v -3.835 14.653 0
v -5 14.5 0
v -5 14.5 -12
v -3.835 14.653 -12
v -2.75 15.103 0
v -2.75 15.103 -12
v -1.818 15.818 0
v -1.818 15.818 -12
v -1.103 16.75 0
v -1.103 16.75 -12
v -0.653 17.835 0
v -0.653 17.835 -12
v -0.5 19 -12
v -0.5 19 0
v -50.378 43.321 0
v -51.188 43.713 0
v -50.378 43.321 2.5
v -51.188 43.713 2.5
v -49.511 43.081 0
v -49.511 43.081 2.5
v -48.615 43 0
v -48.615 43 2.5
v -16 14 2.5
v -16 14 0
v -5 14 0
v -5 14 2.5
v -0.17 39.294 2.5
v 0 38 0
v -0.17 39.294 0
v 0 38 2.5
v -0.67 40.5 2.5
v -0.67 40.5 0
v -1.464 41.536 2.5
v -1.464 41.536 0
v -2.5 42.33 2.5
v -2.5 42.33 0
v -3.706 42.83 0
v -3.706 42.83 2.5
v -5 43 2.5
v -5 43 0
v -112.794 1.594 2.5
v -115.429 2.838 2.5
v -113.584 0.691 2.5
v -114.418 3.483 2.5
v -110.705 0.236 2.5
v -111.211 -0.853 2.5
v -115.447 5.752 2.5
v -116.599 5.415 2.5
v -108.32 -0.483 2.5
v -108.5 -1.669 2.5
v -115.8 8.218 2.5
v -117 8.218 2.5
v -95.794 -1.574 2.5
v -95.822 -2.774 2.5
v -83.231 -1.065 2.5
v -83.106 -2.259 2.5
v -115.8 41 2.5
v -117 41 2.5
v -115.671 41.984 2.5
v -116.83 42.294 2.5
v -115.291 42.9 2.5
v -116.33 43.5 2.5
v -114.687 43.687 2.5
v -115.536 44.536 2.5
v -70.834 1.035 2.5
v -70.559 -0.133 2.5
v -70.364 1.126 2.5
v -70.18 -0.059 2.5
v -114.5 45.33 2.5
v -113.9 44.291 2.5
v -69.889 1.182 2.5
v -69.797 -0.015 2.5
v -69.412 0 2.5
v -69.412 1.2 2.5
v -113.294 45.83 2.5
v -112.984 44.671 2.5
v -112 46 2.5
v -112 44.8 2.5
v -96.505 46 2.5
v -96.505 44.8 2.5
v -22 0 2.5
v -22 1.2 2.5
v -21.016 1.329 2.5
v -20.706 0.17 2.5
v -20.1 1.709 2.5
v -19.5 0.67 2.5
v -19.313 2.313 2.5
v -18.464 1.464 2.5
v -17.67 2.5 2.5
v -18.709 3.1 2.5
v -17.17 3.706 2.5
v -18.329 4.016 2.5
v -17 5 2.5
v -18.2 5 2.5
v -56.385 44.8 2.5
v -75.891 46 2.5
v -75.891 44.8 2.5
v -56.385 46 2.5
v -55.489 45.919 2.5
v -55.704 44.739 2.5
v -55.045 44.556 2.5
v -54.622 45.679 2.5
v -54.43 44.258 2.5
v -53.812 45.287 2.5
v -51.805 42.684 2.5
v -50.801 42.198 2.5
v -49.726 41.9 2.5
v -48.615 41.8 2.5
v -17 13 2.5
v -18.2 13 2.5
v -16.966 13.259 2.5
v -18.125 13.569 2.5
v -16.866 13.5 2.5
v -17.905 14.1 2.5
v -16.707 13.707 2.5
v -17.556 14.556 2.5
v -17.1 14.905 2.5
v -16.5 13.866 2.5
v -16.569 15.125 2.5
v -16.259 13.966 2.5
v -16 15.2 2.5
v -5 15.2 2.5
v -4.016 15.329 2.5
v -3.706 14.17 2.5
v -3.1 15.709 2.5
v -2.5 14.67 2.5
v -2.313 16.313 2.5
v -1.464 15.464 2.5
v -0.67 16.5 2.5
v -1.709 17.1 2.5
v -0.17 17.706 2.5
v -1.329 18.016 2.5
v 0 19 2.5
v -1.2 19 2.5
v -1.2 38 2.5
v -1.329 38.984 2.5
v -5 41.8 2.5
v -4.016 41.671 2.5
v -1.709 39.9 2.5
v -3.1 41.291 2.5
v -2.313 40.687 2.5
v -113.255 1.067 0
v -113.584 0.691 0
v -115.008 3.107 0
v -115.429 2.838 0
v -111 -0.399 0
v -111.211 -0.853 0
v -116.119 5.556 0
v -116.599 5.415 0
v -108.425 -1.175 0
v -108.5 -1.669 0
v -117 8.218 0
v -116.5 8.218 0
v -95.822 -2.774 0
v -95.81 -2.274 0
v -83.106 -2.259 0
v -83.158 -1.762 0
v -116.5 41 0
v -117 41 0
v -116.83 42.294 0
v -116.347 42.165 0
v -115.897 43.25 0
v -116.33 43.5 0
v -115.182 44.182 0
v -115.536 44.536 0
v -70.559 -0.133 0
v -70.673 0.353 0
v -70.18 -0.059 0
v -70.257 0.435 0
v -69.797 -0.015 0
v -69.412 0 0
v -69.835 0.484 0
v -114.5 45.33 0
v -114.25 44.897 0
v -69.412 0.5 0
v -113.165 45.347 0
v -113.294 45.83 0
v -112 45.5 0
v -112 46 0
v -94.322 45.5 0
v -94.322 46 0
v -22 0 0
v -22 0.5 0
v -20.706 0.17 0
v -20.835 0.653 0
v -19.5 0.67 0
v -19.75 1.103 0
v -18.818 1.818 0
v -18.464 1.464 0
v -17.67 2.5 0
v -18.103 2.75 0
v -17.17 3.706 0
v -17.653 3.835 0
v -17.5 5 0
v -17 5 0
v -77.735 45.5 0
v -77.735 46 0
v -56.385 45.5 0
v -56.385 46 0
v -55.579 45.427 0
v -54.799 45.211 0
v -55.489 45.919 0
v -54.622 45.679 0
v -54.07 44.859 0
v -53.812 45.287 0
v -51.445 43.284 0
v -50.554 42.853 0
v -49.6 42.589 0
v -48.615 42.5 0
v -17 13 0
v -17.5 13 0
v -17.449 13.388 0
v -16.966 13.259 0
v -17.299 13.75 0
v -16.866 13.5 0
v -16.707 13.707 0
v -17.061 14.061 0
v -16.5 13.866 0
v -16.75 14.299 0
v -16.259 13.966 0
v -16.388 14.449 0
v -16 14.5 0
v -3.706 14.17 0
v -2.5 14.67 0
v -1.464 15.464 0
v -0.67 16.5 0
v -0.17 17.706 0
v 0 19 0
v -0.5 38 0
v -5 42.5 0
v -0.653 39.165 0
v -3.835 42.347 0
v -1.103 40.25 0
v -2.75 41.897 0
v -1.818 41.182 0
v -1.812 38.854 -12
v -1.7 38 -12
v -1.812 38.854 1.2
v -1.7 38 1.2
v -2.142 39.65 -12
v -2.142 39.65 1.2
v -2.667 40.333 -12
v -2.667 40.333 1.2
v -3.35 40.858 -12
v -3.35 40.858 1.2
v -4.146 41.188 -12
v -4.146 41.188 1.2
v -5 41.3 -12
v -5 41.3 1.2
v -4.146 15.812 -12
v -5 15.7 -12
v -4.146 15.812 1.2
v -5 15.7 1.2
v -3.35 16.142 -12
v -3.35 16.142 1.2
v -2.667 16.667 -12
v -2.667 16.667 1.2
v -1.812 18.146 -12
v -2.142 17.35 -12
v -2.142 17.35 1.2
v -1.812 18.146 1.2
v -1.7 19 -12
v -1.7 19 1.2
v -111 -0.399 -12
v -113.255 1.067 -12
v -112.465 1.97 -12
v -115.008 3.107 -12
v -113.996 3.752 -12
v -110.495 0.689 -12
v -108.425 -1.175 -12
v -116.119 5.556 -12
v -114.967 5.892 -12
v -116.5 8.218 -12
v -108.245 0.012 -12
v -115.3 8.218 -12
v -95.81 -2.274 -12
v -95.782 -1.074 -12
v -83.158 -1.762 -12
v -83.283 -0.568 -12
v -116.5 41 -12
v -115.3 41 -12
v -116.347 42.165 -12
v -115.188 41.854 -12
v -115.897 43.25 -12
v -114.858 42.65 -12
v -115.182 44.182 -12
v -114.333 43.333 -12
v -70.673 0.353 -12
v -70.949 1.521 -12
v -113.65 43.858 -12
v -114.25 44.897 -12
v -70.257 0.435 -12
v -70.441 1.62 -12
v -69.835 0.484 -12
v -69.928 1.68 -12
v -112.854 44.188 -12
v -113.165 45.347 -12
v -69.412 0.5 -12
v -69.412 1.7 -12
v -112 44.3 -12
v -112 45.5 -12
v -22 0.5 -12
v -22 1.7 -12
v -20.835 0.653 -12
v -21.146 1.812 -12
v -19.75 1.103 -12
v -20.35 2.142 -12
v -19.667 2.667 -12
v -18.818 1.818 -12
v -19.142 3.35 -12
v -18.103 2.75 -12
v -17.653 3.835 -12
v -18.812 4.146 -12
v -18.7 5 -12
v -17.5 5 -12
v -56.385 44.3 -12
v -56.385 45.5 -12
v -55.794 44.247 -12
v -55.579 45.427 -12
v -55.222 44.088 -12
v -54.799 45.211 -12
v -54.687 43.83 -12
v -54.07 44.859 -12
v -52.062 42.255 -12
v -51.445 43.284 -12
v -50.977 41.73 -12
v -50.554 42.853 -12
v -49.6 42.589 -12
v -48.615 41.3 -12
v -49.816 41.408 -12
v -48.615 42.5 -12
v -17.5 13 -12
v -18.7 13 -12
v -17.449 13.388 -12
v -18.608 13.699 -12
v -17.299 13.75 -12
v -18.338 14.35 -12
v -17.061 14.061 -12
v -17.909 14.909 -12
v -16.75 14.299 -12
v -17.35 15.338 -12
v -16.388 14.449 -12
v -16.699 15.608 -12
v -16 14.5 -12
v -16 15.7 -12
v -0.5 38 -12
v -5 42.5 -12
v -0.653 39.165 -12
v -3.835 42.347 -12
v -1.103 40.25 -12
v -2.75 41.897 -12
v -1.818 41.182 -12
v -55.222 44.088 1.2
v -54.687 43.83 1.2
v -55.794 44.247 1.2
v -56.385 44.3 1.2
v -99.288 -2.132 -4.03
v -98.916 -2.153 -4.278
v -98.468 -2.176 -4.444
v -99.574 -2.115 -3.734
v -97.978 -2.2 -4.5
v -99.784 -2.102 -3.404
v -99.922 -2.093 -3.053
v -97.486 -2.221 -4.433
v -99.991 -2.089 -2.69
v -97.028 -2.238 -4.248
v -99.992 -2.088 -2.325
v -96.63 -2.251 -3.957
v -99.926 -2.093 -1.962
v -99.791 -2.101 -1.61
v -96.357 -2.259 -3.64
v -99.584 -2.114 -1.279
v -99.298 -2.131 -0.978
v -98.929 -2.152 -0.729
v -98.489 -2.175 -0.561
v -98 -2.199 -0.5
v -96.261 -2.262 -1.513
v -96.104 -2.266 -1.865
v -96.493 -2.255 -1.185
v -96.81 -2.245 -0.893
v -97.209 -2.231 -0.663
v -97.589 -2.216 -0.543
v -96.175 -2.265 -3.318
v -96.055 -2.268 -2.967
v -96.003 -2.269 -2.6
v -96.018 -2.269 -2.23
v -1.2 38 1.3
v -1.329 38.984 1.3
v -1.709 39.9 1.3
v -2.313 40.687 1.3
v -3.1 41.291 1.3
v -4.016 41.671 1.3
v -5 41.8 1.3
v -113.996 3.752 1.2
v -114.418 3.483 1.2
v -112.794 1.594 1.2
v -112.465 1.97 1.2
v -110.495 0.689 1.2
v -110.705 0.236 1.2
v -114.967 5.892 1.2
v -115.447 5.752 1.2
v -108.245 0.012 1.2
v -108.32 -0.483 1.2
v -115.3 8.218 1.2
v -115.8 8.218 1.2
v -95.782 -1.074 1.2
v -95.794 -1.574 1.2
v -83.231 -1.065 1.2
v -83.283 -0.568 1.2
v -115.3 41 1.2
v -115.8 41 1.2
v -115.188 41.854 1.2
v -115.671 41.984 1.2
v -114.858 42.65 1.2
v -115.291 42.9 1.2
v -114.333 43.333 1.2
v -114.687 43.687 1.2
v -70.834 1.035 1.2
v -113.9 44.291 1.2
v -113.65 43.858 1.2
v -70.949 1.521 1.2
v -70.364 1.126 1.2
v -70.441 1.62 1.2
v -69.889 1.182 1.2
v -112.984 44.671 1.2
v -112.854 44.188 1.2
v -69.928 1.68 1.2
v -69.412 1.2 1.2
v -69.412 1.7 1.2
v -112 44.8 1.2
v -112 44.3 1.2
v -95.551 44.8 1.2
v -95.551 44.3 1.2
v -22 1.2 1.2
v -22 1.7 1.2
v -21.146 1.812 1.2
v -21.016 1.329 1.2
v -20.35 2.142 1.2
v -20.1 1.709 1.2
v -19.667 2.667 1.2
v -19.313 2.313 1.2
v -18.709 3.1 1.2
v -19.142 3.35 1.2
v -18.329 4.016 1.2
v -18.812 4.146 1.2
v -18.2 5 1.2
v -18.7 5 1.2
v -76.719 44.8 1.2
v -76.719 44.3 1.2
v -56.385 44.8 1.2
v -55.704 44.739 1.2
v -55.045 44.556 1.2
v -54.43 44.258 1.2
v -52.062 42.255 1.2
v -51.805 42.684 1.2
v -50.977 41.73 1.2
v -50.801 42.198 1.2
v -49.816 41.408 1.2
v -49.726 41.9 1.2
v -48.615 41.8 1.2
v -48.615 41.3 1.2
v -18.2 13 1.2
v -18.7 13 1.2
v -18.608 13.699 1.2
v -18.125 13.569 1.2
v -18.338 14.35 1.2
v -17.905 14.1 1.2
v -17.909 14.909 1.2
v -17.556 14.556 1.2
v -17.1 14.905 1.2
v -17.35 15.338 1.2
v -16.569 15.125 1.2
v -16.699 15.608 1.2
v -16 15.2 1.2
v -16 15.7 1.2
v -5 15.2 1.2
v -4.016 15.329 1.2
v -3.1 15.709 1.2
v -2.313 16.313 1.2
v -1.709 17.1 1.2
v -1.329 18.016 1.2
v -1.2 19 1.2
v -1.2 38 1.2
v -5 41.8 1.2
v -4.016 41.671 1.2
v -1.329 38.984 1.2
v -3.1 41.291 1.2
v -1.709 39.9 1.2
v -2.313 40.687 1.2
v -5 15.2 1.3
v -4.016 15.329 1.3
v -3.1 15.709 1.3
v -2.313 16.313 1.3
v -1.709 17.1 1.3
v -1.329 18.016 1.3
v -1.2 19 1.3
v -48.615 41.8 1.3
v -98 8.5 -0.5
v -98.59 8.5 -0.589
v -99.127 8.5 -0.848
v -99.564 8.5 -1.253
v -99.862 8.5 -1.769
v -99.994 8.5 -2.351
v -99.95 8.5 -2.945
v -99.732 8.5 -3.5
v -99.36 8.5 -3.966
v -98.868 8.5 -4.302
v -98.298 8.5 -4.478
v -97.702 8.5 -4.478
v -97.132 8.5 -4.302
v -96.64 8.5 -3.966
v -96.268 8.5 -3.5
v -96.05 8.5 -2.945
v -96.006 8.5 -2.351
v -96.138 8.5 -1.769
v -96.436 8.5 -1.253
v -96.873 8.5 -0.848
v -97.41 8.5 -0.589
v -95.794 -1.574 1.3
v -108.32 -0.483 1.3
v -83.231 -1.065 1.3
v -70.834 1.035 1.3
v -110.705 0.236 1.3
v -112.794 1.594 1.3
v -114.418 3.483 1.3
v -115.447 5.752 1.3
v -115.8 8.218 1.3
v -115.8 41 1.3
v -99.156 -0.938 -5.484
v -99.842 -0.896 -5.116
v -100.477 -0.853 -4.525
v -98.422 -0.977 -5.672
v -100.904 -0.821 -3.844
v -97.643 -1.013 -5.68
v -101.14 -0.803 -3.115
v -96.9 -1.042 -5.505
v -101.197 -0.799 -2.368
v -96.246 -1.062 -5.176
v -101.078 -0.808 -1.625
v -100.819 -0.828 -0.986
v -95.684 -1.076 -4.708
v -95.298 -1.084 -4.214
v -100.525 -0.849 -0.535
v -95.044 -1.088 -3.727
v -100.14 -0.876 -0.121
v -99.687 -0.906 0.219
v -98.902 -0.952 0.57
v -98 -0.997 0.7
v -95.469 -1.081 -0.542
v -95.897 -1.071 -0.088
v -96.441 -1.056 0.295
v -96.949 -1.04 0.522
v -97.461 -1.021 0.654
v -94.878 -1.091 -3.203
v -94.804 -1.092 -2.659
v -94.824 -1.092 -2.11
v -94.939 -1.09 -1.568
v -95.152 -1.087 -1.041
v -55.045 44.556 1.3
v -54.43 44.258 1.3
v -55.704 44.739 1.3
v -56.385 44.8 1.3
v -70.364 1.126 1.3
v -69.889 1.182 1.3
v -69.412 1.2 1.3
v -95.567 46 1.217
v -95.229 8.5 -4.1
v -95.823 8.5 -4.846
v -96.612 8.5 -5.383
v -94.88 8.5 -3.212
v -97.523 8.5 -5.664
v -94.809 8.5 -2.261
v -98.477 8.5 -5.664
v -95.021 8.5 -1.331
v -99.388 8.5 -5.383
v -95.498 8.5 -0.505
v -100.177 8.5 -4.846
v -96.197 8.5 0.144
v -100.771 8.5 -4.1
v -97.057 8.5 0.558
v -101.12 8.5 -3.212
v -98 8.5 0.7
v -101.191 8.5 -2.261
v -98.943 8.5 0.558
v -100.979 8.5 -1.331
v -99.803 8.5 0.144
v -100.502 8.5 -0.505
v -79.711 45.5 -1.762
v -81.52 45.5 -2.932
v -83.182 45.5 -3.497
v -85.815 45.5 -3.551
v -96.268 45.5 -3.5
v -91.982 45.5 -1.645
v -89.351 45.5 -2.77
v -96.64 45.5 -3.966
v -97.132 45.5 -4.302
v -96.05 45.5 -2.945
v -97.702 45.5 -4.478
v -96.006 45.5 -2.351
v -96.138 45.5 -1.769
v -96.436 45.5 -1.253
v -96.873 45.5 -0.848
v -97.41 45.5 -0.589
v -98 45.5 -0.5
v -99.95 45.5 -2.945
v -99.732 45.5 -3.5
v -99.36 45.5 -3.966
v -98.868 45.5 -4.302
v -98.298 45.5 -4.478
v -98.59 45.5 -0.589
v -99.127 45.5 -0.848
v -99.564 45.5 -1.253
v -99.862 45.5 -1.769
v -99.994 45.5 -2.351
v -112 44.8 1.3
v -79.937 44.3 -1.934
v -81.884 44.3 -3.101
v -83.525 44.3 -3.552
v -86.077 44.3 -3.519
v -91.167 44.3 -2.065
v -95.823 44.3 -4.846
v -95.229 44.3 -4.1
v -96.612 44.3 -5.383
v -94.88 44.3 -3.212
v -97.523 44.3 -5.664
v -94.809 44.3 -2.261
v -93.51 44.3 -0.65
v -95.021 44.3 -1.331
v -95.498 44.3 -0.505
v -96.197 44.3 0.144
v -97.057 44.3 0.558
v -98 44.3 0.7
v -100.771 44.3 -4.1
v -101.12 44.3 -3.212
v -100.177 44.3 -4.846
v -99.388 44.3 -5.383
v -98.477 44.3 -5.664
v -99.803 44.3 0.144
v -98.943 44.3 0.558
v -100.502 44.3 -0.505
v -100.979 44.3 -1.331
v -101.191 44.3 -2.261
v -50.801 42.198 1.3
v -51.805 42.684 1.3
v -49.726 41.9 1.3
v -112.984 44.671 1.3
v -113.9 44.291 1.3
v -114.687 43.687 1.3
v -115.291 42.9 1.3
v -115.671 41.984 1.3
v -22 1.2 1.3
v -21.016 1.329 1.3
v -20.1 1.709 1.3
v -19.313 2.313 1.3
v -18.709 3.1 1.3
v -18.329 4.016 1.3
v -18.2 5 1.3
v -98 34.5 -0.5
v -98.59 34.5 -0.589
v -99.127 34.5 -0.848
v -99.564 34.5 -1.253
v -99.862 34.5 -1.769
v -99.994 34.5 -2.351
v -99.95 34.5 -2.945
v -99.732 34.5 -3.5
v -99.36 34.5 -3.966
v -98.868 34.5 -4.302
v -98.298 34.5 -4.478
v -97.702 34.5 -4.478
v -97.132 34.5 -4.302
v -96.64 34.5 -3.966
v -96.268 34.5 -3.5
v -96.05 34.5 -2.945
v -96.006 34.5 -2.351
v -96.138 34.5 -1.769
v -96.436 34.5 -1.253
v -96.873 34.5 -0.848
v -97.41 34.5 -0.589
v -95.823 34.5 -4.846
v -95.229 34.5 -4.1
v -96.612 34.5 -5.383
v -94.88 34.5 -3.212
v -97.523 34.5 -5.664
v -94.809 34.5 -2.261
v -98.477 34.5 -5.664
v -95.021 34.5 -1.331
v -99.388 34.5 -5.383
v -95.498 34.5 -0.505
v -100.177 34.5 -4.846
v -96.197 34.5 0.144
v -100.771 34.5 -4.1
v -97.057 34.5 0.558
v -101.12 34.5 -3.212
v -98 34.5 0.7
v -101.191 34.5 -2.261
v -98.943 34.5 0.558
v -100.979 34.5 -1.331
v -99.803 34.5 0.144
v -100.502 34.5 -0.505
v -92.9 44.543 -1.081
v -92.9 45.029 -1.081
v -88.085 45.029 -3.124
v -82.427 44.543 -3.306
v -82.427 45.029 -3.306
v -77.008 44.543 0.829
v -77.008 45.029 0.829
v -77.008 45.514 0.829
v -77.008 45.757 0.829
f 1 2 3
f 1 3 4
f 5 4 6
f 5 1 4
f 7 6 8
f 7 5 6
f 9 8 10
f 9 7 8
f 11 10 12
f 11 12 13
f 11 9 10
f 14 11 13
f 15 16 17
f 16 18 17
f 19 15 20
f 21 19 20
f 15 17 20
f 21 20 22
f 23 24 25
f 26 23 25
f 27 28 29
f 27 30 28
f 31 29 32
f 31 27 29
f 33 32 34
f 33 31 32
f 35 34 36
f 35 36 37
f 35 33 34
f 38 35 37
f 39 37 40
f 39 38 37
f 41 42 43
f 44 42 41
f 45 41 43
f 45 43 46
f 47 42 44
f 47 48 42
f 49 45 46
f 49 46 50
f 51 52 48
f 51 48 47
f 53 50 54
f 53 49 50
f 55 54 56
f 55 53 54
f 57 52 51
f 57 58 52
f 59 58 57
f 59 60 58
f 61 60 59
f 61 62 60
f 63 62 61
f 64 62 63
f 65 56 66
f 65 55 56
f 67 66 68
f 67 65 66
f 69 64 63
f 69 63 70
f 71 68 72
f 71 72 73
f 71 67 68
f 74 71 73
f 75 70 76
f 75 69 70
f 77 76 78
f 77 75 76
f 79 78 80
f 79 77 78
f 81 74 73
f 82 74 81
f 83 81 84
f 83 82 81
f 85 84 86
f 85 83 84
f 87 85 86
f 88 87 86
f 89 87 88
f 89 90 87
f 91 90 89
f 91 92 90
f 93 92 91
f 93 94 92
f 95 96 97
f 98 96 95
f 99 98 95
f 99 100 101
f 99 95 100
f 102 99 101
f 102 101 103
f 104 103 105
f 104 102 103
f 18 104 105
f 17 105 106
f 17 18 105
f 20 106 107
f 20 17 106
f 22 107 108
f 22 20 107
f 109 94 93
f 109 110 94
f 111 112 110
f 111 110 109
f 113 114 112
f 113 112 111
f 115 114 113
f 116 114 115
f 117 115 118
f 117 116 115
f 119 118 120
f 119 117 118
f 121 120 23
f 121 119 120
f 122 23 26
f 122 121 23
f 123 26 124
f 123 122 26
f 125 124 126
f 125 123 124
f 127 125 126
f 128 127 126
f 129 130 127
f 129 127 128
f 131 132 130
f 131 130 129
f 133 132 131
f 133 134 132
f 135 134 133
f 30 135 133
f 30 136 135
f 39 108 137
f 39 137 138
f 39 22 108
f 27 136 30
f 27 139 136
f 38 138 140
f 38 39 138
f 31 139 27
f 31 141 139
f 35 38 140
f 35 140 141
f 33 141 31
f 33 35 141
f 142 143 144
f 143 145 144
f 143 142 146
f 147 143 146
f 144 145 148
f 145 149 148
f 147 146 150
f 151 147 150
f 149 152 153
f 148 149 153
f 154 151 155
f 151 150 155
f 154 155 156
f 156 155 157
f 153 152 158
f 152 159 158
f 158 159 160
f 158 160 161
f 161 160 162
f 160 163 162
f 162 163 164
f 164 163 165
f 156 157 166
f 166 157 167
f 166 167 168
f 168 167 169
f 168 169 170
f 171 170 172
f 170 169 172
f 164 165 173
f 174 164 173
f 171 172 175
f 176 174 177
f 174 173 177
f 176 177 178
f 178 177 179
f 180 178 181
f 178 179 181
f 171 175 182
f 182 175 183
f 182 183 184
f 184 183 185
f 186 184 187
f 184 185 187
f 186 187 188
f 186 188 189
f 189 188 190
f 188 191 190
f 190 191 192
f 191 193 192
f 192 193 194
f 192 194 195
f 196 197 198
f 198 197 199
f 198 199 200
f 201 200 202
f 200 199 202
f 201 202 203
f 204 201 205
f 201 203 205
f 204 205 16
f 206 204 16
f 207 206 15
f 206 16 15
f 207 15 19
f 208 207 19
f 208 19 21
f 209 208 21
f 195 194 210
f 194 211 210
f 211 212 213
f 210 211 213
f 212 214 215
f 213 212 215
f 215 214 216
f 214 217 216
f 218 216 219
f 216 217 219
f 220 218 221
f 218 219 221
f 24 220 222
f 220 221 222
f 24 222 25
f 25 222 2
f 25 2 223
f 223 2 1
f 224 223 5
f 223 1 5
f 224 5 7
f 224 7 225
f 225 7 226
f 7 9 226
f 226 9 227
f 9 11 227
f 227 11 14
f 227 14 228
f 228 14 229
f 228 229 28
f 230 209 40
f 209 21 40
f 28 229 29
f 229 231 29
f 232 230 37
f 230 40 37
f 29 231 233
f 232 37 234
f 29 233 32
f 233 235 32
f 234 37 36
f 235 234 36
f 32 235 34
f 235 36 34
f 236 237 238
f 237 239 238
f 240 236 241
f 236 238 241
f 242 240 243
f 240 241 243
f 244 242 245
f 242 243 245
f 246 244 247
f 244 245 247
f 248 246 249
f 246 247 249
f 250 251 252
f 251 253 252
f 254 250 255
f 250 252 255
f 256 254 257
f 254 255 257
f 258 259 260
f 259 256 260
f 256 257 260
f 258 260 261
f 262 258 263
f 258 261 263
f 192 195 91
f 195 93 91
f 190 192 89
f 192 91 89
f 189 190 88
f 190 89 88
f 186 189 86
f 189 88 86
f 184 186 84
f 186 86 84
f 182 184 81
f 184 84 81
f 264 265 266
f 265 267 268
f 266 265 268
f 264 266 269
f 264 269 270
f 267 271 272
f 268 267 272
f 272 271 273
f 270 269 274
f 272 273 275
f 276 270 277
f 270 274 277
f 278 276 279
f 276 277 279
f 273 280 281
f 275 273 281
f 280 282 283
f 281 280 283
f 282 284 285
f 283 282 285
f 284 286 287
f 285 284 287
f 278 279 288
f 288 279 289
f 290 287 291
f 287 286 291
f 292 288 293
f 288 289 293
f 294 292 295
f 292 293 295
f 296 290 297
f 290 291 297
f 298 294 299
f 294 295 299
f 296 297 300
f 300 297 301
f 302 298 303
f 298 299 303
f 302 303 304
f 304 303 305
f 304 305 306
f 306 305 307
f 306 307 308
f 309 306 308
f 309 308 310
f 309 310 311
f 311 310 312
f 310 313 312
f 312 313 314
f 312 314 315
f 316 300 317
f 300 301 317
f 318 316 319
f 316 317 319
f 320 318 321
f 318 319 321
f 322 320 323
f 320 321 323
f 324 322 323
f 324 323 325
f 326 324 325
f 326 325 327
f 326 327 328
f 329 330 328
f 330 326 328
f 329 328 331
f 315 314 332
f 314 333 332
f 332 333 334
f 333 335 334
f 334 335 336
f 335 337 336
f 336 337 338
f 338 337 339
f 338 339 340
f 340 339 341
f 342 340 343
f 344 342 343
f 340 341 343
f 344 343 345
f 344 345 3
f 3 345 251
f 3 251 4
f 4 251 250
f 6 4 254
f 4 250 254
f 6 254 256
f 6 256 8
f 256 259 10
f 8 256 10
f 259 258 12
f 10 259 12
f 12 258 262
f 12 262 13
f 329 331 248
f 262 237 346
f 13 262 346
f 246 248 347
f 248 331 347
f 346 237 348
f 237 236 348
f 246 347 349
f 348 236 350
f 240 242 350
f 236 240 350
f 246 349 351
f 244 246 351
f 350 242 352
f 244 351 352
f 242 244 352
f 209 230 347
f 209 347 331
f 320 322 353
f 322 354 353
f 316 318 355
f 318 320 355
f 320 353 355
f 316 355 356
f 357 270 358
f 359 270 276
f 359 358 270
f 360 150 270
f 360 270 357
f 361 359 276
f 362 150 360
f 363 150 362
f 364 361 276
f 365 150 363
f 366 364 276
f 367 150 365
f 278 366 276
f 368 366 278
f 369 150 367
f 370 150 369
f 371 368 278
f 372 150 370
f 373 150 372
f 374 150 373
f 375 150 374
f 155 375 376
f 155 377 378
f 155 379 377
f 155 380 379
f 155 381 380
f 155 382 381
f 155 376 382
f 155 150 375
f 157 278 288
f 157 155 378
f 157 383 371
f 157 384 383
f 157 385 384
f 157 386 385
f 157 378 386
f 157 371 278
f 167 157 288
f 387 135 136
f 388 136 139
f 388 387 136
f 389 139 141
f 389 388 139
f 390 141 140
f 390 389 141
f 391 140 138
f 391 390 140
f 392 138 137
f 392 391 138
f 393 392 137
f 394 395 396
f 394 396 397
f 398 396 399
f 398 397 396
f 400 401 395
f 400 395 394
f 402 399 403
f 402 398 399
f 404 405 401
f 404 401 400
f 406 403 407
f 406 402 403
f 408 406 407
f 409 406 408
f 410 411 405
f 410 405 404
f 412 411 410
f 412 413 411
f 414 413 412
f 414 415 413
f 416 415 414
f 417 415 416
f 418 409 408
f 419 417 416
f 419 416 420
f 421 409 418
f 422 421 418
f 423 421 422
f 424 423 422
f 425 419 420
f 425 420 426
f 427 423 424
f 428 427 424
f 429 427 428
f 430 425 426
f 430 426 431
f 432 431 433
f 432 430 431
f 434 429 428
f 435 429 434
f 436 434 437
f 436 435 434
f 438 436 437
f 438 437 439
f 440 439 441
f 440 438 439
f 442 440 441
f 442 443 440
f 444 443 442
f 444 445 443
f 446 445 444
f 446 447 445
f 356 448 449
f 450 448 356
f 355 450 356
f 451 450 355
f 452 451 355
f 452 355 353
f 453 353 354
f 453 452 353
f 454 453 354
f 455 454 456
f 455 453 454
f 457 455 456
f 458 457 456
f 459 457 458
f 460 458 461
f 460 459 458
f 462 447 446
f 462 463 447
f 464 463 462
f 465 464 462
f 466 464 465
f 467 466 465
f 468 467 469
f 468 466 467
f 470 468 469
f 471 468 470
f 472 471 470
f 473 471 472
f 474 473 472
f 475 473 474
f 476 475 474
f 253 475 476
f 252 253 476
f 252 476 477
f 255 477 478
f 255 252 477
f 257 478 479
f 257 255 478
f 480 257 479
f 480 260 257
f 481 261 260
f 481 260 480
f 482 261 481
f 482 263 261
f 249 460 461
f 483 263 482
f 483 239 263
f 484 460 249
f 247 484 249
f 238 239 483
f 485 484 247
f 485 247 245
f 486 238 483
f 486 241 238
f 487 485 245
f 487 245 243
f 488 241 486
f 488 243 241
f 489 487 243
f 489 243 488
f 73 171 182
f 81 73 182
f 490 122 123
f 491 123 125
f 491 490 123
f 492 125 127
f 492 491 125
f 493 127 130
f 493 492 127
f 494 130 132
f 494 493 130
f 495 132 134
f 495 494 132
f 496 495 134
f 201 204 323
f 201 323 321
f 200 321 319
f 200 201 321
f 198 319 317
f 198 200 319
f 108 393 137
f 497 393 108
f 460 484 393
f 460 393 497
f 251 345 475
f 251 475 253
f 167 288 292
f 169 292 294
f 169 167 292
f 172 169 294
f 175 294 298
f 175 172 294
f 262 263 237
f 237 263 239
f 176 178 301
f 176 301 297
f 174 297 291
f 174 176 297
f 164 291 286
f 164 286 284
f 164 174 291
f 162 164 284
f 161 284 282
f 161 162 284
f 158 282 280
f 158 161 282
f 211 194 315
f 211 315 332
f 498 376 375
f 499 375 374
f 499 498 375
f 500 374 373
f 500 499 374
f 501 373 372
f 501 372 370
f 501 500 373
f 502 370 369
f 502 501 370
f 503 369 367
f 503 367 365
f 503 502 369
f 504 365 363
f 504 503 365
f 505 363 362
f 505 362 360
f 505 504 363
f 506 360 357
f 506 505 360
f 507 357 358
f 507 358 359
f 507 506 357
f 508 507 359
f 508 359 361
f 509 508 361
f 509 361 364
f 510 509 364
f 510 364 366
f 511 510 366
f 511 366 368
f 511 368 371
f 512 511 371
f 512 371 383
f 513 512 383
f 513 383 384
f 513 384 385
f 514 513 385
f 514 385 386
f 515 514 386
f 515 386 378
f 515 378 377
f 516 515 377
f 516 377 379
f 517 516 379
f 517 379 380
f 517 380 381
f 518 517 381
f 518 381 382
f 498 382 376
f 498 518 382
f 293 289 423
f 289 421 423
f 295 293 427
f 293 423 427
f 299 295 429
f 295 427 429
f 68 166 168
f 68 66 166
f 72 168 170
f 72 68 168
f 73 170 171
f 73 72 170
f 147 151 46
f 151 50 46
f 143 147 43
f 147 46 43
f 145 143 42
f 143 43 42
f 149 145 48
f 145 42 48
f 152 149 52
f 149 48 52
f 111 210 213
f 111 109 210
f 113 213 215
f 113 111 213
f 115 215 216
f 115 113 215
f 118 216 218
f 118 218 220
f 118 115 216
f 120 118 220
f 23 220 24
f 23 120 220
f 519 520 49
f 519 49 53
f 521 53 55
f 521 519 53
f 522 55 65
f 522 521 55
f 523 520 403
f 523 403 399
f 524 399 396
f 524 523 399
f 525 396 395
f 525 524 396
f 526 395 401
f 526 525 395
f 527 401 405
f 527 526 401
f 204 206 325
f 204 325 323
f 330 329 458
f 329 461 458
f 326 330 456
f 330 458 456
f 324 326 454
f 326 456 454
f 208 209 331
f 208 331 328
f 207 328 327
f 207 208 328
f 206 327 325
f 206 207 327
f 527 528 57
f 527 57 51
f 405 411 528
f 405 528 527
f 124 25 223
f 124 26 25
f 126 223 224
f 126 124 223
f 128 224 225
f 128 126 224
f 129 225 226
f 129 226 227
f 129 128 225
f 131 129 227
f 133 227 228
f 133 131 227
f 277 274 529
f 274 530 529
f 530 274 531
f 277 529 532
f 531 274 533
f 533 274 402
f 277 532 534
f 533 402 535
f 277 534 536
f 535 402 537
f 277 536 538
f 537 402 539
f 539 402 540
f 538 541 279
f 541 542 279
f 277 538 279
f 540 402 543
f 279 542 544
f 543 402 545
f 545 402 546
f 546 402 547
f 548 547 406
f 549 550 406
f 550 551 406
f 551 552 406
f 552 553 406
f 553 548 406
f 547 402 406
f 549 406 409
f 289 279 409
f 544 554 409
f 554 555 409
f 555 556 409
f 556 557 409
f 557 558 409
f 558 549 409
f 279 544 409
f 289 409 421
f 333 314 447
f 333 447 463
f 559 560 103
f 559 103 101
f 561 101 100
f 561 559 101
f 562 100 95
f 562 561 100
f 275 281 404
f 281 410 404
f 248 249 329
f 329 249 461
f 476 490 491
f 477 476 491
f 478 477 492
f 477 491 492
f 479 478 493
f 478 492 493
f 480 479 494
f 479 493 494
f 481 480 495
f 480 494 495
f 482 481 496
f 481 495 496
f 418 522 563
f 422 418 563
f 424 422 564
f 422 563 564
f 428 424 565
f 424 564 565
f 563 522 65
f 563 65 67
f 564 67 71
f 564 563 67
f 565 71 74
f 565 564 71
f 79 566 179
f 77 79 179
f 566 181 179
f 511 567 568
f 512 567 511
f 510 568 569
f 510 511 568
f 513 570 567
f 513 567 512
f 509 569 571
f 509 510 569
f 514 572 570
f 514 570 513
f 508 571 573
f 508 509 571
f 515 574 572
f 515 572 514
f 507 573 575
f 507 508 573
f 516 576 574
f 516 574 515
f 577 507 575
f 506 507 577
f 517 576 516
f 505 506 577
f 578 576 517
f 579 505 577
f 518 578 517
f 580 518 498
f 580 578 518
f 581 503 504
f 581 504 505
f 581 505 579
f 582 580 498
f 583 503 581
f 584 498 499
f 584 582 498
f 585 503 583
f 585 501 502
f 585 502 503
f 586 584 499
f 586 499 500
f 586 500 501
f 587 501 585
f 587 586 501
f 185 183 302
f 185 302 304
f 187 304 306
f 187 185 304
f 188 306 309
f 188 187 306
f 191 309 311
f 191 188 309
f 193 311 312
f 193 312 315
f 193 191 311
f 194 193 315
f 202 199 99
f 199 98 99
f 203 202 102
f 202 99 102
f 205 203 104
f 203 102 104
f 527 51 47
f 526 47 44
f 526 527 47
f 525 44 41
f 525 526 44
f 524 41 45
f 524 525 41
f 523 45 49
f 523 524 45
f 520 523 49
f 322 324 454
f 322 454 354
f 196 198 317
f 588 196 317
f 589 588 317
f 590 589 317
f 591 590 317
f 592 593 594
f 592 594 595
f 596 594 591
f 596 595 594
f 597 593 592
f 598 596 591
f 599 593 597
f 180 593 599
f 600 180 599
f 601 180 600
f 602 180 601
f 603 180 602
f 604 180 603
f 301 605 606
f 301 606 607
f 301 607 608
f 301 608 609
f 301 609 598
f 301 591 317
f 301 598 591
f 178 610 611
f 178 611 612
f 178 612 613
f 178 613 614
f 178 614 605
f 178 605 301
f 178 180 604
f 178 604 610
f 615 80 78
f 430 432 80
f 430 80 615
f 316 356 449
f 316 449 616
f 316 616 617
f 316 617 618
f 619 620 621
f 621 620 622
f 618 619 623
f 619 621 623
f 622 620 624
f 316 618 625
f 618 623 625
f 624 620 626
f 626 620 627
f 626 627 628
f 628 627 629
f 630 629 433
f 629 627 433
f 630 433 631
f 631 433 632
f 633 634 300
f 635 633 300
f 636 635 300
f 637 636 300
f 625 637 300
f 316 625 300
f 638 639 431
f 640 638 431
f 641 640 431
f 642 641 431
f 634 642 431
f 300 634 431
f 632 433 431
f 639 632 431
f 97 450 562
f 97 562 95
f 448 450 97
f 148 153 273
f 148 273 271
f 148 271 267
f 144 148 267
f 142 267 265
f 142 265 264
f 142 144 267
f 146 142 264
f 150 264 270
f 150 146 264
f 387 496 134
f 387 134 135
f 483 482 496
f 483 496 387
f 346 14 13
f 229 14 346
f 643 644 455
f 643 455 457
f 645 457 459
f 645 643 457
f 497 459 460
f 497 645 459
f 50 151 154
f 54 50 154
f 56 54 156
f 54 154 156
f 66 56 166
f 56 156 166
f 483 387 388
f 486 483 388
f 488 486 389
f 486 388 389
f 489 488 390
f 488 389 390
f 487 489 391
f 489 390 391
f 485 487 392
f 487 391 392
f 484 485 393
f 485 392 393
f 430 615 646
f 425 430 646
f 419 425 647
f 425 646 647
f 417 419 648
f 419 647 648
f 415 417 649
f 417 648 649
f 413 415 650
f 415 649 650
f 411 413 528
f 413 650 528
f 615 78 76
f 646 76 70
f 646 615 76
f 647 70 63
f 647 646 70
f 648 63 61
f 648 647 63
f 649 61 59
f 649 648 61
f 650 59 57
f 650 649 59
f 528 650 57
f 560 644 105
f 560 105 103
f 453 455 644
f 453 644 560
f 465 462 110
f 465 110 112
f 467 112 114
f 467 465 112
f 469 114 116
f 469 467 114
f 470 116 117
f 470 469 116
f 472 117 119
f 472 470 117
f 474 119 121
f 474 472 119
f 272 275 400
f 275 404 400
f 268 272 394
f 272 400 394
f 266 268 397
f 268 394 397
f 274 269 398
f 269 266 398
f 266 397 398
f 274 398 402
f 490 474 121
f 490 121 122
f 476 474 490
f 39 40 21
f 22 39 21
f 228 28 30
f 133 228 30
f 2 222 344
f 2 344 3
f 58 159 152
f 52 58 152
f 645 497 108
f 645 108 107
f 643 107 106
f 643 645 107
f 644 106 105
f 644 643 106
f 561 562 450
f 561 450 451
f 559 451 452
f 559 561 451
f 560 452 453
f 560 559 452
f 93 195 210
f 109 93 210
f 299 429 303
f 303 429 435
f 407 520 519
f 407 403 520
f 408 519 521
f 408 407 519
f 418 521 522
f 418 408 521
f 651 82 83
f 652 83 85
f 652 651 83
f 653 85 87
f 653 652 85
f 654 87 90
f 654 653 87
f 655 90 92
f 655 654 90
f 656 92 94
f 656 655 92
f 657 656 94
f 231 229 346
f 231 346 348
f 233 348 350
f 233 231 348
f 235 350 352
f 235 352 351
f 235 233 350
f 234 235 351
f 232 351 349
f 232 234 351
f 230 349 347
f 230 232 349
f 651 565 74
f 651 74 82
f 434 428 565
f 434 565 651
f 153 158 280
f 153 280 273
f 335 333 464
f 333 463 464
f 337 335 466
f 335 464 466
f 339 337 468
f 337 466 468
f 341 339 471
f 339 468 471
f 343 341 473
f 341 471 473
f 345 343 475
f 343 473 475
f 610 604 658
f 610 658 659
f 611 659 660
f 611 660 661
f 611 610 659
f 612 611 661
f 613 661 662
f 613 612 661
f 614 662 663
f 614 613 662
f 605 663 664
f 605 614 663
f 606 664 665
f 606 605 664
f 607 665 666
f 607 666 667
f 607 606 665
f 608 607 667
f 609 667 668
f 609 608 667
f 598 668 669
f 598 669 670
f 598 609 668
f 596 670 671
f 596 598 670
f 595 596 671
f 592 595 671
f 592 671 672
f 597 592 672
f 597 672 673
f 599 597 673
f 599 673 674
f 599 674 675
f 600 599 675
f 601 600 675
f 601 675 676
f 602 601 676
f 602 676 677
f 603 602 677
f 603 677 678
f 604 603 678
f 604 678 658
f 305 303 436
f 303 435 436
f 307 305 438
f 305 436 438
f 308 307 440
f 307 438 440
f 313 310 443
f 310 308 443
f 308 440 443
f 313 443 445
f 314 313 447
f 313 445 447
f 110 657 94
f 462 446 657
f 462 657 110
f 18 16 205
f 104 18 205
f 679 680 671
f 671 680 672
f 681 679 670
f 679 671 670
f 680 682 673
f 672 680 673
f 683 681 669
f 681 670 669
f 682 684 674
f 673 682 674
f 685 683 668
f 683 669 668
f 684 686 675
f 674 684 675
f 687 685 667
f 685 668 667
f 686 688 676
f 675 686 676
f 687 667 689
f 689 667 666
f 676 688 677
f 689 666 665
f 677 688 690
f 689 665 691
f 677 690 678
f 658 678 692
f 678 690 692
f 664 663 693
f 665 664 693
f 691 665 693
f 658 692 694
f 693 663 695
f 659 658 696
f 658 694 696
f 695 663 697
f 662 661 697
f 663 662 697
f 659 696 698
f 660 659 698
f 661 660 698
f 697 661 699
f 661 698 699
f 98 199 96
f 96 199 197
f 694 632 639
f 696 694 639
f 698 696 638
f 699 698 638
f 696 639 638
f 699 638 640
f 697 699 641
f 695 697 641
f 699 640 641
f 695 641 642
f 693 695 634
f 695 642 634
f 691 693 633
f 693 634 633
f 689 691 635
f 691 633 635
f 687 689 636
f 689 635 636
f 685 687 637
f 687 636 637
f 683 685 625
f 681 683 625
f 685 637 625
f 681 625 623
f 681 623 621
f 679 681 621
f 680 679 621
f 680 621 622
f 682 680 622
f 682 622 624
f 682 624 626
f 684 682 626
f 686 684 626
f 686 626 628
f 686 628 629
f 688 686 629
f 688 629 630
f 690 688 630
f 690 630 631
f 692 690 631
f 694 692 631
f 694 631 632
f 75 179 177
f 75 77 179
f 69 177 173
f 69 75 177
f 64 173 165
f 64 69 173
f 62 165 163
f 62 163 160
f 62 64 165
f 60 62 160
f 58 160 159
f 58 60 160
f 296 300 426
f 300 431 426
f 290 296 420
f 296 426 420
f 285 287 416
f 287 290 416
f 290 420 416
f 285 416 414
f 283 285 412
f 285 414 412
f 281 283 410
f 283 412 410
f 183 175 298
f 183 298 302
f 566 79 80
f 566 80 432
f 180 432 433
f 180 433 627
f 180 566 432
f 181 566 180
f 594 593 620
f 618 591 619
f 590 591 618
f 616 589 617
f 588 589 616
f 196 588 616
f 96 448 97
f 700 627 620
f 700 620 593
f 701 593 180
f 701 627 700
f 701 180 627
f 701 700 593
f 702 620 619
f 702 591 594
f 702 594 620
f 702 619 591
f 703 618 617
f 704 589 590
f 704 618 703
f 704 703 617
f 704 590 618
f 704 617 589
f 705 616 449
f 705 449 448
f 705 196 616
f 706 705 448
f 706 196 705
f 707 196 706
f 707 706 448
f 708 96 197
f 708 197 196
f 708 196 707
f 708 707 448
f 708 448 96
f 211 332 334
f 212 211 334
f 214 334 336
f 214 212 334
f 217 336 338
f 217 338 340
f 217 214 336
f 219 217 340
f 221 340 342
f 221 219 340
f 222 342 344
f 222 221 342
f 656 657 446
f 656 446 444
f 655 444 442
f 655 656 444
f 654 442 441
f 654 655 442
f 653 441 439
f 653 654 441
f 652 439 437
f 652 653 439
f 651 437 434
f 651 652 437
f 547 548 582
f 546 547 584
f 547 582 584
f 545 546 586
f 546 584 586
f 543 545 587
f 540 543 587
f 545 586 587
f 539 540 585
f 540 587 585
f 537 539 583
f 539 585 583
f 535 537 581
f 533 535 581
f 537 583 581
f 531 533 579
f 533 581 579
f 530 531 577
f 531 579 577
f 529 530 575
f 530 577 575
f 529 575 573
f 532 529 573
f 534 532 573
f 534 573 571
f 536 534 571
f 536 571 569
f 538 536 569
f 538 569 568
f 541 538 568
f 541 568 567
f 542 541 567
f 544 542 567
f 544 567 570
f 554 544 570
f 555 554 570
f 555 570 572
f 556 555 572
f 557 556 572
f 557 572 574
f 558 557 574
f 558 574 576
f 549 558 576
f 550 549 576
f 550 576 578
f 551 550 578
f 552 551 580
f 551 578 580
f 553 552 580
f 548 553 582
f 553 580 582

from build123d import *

# Parameters (mm, degrees)
EXTRUDE_1_DEPTH     = 2.5
FILLET_1_R          = 5
FILLET_2_R          = 10
FILLET_3_R          = 5
FILLET_4_R          = 1
EXTRUDE_2_DEPTH     = 12
SKETCH_3_R          = 2
CUT_EXTRUDE_1_DEPTH = 128.145329142
SHELL_1_T           = -1.2
CUT_EXTRUDE_2_DEPTH = 127.419500089
SKETCH_5_W          = 29.908945793
SKETCH_5_H          = 26
CUT_EXTRUDE_3_DEPTH = 12
CUT_EXTRUDE_4_DEPTH = 25
SKETCH_7_W          = 24.826968957
SKETCH_7_H          = 53.255380941
CUT_EXTRUDE_5_DEPTH = 140


with BuildPart() as part:
    # 草图1 → 凸台-拉伸1 (new body)
    with BuildSketch(Plane.XY):
        with BuildLine():
            Line((17, 0), (17, 14))
            Line((17, 14), (0, 14))
            Line((0, 14), (0, 43))
            Line((0, 43), (50, 43))
            Line((50, 43), (55, 46))
            Line((55, 46), (117, 46))
            Line((117, 46), (117, 43))
            Line((117, 43), (117, 0))
            ThreePointArc((117, 0), (93.5, -2.800462964), (70, 0))
            Line((70, 0), (17, 0))
        make_face()
    extrude(amount=EXTRUDE_1_DEPTH)

    # 圆角1
    fillet_1_edges = [part.edges().sort_by_distance(p)[0] for p in [
        (17, 0, 1.25),
        (0, 14, 1.25),
        (0, 43, 1.25),
        (117, 46, 1.25),
    ]]
    fillet(fillet_1_edges, radius=FILLET_1_R)

    # 圆角2
    fillet_2_edges = [part.edges().sort_by_distance(p)[0] for p in [
        (117, 0, 1.25),
    ]]
    fillet(fillet_2_edges, radius=FILLET_2_R)

    # 圆角3
    fillet_3_edges = [part.edges().sort_by_distance(p)[0] for p in [
        (70, 0, 1.25),
        (50, 43, 1.25),
        (55, 46, 1.25),
    ]]
    fillet(fillet_3_edges, radius=FILLET_3_R)

    # 圆角4
    fillet_4_edges = [part.edges().sort_by_distance(p)[0] for p in [
        (17, 14, 1.25),
    ]]
    fillet(fillet_4_edges, radius=FILLET_4_R)

    # 草图2 → 凸台-拉伸2 (add)
    with BuildSketch(Plane(origin=(0, 0, 0), x_dir=(-1, 0, 0), z_dir=(0, 0, -1))):
        with BuildLine():
            Line((-51.44480683, 43.283788909), (-54.069688925, 44.858718166))
            ThreePointArc((-54.069688925, 44.858718166), (-55.183718706, 45.336717177), (-56.384919825, 45.5))
            Line((-56.384919825, 45.5), (-112, 45.5))
            ThreePointArc((-112, 45.5), (-115.181980515, 44.181980515), (-116.5, 41))
            Line((-116.5, 41), (-116.5, 8.217797336))
            ThreePointArc((-116.5, 8.217797336), (-114.203731672, 2.024555051), (-108.425, -1.174719632))
            ThreePointArc((-108.425, -1.174719632), (-89.475956652, -2.219058182), (-70.673302226, 0.353309083))
            ThreePointArc((-70.673302226, 0.353309083), (-70.04666276, 0.463204186), (-69.411524962, 0.5))
            Line((-69.411524962, 0.5), (-22, 0.5))
            ThreePointArc((-22, 0.5), (-18.818019485, 1.818019485), (-17.5, 5))
            Line((-17.5, 5), (-17.5, 13))
            ThreePointArc((-17.5, 13), (-17.060660172, 14.060660172), (-16, 14.5))
            Line((-16, 14.5), (-5, 14.5))
            ThreePointArc((-5, 14.5), (-1.818019485, 15.818019485), (-0.5, 19))
            Line((-0.5, 19), (-0.5, 38))
            ThreePointArc((-0.5, 38), (-1.818019485, 41.181980515), (-5, 42.5))
            Line((-5, 42.5), (-48.615080175, 42.5))
            ThreePointArc((-48.615080175, 42.5), (-50.083214876, 42.699567895), (-51.44480683, 43.283788909))
        make_face()
    extrude(amount=EXTRUDE_2_DEPTH)

    # 草图3 → 切除-拉伸1 (cut, through all)
    with BuildSketch(Plane(origin=(0, 45.5, 0), x_dir=(1, 0, 0), z_dir=(0, 1, 0))):
        with Locations(Location((98, 2.5, 0), (0, 0, 270))):
            Circle(SKETCH_3_R)
    extrude(amount=-CUT_EXTRUDE_1_DEPTH, mode=Mode.SUBTRACT)

    # 抽壳1
    shell_1_openings = [part.faces().sort_by_distance(p)[0] for p in [
        (62.500022263, 22.701927877, -12),
    ]]
    offset(amount=SHELL_1_T, openings=shell_1_openings, kind=Kind.INTERSECTION)

    # 草图4 → 切除-拉伸2 (cut, through all)
    with BuildSketch(Plane(origin=(0, 0, 1.3), x_dir=(-1, 0, 0), z_dir=(0, 0, -1))):
        with BuildLine():
            Line((-56.384919825, 44.8), (-112, 44.8))
            ThreePointArc((-112, 44.8), (-114.687005769, 43.687005769), (-115.8, 41))
            Line((-115.8, 41), (-115.8, 8.217797336))
            ThreePointArc((-115.8, 8.217797336), (-113.672930391, 2.48089922), (-108.32, -0.482639434))
            ThreePointArc((-108.32, -0.482639434), (-89.504266505, -1.519630879), (-70.83389206, 1.03463933))
            ThreePointArc((-70.83389206, 1.03463933), (-70.12749848, 1.158521082), (-69.411524962, 1.2))
            Line((-69.411524962, 1.2), (-22, 1.2))
            ThreePointArc((-22, 1.2), (-19.312994231, 2.312994231), (-18.2, 5))
            Line((-18.2, 5), (-18.2, 13))
            ThreePointArc((-18.2, 13), (-17.555634919, 14.555634919), (-16, 15.2))
            Line((-16, 15.2), (-5, 15.2))
            ThreePointArc((-5, 15.2), (-2.312994231, 16.312994231), (-1.2, 19))
            Line((-1.2, 19), (-1.2, 38))
            ThreePointArc((-1.2, 38), (-2.312994231, 40.687005769), (-5, 41.8))
            Line((-5, 41.8), (-48.615080175, 41.8))
            ThreePointArc((-48.615080175, 41.8), (-50.270068383, 42.024967445), (-51.804953859, 42.683543861))
            Line((-51.804953859, 42.683543861), (-54.429835954, 44.258473118))
            ThreePointArc((-54.429835954, 44.258473118), (-55.370572214, 44.662116727), (-56.384919825, 44.8))
        make_face()
    extrude(amount=-CUT_EXTRUDE_2_DEPTH, mode=Mode.SUBTRACT)

    # 草图5 → 切除-拉伸3 (cut)
    with BuildSketch(Plane.XY.offset(2.5)):
        with Locations((94.149762403, 21.5)):
            Rectangle(SKETCH_5_W, SKETCH_5_H)
    extrude(amount=-CUT_EXTRUDE_3_DEPTH, mode=Mode.SUBTRACT)

    # 草图6 → 切除-拉伸4 (cut)
    with BuildSketch(Plane(origin=(0, 46, 0), x_dir=(1, 0, 0), z_dir=(0, 1, 0))):
        with BuildLine():
            add(Edge.make_bspline(
                [(96.996390033, -4.054230802), (96.985471859, -2.387863189), (93.231055265, 1.445134708), (88.130068901, 3.304325139), (82.90634874, 4.073922209), (79.327396591, 1.560107395), (76.925149921, -0.689014198), (71.094345742, -10.024640193), (97.032245655, -9.526634001), (96.996390033, -4.054230802)],
                knots=[0, 0, 0, 0, 0.1331942, 0.239246022, 0.354041302, 0.427365379, 0.493243552, 0.562586095, 1, 1, 1, 1], degree=3))
        make_face()
    extrude(amount=-CUT_EXTRUDE_4_DEPTH, mode=Mode.SUBTRACT)

    # 镜向1: part across plane


with BuildPart() as part_1:
    add(part.part)
    add(part.part.mirror(Plane(origin=(0, 14, 2.5), x_dir=(0, 0, 1), z_dir=(1, 0, 0))))

    # 草图7 → 切除-拉伸5 (cut)
    with BuildSketch(Plane.ZY):
        with Locations((-5.12662644, 20.756877597)):
            Rectangle(SKETCH_7_W, SKETCH_7_H)
    extrude(amount=-CUT_EXTRUDE_5_DEPTH, mode=Mode.SUBTRACT)


solid = part_1.part
